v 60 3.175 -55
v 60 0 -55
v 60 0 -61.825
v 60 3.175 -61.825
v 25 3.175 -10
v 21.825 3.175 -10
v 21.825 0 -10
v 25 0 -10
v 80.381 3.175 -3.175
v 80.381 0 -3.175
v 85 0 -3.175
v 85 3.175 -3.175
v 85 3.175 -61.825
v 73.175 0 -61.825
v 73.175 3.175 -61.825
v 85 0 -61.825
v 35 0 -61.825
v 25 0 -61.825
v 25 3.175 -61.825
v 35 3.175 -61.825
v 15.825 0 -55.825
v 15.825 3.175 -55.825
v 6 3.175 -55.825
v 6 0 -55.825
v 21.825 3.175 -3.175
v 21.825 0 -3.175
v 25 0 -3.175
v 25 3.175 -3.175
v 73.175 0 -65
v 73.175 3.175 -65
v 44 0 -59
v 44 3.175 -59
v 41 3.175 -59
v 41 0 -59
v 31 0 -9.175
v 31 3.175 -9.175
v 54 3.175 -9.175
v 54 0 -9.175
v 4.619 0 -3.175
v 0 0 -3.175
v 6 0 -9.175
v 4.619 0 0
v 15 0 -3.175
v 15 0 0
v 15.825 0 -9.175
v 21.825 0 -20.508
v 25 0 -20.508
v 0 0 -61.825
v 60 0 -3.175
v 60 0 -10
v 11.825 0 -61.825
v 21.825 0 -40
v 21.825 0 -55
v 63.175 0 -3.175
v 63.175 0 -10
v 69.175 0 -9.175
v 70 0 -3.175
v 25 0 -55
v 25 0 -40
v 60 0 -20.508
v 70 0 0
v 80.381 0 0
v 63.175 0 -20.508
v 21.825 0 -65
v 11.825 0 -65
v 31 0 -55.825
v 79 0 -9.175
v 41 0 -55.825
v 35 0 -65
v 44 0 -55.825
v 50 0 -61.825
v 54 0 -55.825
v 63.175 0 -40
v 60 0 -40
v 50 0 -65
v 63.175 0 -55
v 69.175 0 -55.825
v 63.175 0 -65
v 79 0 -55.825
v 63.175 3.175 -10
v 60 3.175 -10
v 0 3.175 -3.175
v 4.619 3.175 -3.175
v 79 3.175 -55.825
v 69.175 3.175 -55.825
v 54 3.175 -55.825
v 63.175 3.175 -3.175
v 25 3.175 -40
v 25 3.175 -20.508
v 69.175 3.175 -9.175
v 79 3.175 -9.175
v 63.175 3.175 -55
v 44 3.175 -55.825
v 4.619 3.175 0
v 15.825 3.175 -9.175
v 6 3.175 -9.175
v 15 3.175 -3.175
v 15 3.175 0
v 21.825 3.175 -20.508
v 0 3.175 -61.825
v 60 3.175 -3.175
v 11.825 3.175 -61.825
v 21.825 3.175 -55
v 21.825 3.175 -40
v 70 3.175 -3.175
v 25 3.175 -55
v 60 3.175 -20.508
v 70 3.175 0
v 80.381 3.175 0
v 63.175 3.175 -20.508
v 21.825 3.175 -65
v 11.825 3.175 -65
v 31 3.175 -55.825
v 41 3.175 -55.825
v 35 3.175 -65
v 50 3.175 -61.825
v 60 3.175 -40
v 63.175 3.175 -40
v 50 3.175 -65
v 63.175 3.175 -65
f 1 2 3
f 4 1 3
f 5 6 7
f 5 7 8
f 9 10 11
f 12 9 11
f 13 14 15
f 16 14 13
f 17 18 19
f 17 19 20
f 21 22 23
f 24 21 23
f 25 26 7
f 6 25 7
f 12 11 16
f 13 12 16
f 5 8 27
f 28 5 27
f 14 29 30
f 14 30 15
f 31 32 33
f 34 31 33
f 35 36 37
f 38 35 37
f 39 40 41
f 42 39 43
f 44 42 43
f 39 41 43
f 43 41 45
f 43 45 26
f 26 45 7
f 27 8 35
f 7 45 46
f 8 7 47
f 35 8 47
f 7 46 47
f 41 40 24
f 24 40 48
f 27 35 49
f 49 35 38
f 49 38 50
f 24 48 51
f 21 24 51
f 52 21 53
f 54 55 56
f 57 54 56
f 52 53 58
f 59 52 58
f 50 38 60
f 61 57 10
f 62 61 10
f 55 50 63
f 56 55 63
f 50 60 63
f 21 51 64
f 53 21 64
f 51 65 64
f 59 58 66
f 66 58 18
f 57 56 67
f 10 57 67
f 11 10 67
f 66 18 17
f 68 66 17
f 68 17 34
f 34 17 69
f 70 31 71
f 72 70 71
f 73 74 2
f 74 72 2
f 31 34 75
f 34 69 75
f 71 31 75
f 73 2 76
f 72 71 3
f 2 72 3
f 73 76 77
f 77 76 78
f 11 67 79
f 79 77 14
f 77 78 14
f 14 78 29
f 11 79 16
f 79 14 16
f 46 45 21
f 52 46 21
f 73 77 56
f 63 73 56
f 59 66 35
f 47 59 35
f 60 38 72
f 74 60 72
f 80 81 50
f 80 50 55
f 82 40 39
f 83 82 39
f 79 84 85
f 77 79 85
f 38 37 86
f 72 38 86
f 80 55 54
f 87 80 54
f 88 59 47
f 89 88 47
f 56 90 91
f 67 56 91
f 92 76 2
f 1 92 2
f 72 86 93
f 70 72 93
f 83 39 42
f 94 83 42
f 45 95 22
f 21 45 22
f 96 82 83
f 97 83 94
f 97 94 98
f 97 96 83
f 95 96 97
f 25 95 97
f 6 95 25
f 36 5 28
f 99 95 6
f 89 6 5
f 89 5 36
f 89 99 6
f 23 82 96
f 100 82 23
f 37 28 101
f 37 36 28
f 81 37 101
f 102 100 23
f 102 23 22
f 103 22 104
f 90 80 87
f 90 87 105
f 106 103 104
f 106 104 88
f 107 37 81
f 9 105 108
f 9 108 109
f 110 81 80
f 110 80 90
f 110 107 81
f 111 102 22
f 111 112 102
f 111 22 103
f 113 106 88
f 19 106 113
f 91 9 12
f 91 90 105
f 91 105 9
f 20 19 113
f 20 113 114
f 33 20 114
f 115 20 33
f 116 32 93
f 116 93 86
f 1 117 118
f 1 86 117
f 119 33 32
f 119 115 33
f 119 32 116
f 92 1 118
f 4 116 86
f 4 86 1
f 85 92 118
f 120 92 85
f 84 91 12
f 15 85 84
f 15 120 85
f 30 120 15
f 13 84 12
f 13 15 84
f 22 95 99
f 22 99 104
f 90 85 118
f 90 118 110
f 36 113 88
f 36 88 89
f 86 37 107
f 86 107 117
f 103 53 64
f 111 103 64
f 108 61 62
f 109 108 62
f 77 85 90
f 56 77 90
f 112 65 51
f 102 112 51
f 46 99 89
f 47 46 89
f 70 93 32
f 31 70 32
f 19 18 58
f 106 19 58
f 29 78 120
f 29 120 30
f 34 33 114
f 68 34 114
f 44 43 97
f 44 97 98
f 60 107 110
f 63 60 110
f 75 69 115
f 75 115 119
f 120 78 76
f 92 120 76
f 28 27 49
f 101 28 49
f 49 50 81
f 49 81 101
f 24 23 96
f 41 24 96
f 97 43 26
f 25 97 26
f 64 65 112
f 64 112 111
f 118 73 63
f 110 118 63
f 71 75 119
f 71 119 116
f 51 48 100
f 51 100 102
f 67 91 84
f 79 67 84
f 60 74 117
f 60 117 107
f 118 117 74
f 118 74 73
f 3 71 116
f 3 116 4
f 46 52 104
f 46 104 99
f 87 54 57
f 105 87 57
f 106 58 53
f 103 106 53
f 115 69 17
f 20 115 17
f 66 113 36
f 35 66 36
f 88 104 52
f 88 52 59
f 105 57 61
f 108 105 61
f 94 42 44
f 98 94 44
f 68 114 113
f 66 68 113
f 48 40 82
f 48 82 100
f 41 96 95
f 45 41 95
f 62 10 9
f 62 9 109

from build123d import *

# Parameters (mm, degrees)
SKETCH1_W           = 85
SKETCH1_H           = 65
BOSS_EXTRUDE1_DEPTH = 3.175
SKETCH2_W           = 3.175
SKETCH2_H           = 6.825
SKETCH2_H_2         = 3.175
SKETCH2_W_2         = 6.825
SKETCH2_W_3         = 4.619
SKETCH2_W_4         = 35
SKETCH2_H_3         = 19.492
SKETCH2_W_5         = 11.825
SKETCH2_W_6         = 10
CUT_EXTRUDE1_DEPTH  = 4.175
CUT_EXTRUDE2_DEPTH  = 4.175


with BuildPart() as part:
    # Sketch1 → Boss-Extrude1 (new body)
    with BuildSketch(Plane(origin=(0, 0, 0), x_dir=(1, 0, 0), z_dir=(0, 1, 0))):
        with Locations((42.5, 32.5)):
            Rectangle(SKETCH1_W, SKETCH1_H)
    extrude(amount=BOSS_EXTRUDE1_DEPTH)

    # Sketch2 → Cut-Extrude1 (cut, through all)
    with BuildSketch(Plane.XZ):
        with Locations((23.4125, -6.5875)):
            Rectangle(SKETCH2_W, SKETCH2_H)
        with Locations((23.4125, -1.5875)):
            Rectangle(SKETCH2_W, SKETCH2_H_2)
        with Locations((18.4125, -1.5875)):
            Rectangle(SKETCH2_W_2, SKETCH2_H_2)
        with Locations((2.3095, -1.5875)):
            Rectangle(SKETCH2_W_3, SKETCH2_H_2)
        with Locations((66.5875, -1.5875)):
            Rectangle(SKETCH2_W_2, SKETCH2_H_2)
        with Locations((61.5875, -1.5875)):
            Rectangle(SKETCH2_W, SKETCH2_H_2)
        with Locations((82.6905, -1.5875)):
            Rectangle(SKETCH2_W_3, SKETCH2_H_2)
        with Locations((42.5, -1.5875)):
            Rectangle(SKETCH2_W_4, SKETCH2_H_2)
        with Locations((61.5875, -6.5875)):
            Rectangle(SKETCH2_W, SKETCH2_H)
        with Locations((61.5875, -30.254)):
            Rectangle(SKETCH2_W, SKETCH2_H_3)
        with Locations((23.4125, -30.254)):
            Rectangle(SKETCH2_W, SKETCH2_H_3)
        Polygon((21.825, -65), (25, -65), (25, -61.825), (25, -55), (21.825, -55), align=None)
        Polygon((60, -65), (63.175, -65), (63.175, -55), (60, -55), (60, -61.825), align=None)
        with Locations((79.0875, -63.4125)):
            Rectangle(SKETCH2_W_5, SKETCH2_H_2)
        with Locations((55, -63.4125)):
            Rectangle(SKETCH2_W_6, SKETCH2_H_2)
        with Locations((30, -63.4125)):
            Rectangle(SKETCH2_W_6, SKETCH2_H_2)
        with Locations((5.9125, -63.4125)):
            Rectangle(SKETCH2_W_5, SKETCH2_H_2)
    extrude(amount=-CUT_EXTRUDE1_DEPTH, mode=Mode.SUBTRACT)

    # Sketch3 → Cut-Extrude2 (cut, through all)
    with BuildSketch(Plane(origin=(0, 3.175, 0), x_dir=(1, 0, 0), z_dir=(0, 1, 0))):
        Polygon((69.175, 49), (69.175, 16), (69.175, 9.175), (79, 9.175), (79, 55.825), (69.175, 55.825), align=None)
        Polygon((31, 55.825), (31, 9.175), (54, 9.175), (54, 55.825), (44, 55.825), (44, 59), (41, 59), (41, 55.825), align=None)
        Polygon((15.825, 49), (15.825, 55.825), (6, 55.825), (6, 9.175), (15.825, 9.175), (15.825, 16), align=None)
    extrude(amount=-CUT_EXTRUDE2_DEPTH, mode=Mode.SUBTRACT)


solid = part.part
